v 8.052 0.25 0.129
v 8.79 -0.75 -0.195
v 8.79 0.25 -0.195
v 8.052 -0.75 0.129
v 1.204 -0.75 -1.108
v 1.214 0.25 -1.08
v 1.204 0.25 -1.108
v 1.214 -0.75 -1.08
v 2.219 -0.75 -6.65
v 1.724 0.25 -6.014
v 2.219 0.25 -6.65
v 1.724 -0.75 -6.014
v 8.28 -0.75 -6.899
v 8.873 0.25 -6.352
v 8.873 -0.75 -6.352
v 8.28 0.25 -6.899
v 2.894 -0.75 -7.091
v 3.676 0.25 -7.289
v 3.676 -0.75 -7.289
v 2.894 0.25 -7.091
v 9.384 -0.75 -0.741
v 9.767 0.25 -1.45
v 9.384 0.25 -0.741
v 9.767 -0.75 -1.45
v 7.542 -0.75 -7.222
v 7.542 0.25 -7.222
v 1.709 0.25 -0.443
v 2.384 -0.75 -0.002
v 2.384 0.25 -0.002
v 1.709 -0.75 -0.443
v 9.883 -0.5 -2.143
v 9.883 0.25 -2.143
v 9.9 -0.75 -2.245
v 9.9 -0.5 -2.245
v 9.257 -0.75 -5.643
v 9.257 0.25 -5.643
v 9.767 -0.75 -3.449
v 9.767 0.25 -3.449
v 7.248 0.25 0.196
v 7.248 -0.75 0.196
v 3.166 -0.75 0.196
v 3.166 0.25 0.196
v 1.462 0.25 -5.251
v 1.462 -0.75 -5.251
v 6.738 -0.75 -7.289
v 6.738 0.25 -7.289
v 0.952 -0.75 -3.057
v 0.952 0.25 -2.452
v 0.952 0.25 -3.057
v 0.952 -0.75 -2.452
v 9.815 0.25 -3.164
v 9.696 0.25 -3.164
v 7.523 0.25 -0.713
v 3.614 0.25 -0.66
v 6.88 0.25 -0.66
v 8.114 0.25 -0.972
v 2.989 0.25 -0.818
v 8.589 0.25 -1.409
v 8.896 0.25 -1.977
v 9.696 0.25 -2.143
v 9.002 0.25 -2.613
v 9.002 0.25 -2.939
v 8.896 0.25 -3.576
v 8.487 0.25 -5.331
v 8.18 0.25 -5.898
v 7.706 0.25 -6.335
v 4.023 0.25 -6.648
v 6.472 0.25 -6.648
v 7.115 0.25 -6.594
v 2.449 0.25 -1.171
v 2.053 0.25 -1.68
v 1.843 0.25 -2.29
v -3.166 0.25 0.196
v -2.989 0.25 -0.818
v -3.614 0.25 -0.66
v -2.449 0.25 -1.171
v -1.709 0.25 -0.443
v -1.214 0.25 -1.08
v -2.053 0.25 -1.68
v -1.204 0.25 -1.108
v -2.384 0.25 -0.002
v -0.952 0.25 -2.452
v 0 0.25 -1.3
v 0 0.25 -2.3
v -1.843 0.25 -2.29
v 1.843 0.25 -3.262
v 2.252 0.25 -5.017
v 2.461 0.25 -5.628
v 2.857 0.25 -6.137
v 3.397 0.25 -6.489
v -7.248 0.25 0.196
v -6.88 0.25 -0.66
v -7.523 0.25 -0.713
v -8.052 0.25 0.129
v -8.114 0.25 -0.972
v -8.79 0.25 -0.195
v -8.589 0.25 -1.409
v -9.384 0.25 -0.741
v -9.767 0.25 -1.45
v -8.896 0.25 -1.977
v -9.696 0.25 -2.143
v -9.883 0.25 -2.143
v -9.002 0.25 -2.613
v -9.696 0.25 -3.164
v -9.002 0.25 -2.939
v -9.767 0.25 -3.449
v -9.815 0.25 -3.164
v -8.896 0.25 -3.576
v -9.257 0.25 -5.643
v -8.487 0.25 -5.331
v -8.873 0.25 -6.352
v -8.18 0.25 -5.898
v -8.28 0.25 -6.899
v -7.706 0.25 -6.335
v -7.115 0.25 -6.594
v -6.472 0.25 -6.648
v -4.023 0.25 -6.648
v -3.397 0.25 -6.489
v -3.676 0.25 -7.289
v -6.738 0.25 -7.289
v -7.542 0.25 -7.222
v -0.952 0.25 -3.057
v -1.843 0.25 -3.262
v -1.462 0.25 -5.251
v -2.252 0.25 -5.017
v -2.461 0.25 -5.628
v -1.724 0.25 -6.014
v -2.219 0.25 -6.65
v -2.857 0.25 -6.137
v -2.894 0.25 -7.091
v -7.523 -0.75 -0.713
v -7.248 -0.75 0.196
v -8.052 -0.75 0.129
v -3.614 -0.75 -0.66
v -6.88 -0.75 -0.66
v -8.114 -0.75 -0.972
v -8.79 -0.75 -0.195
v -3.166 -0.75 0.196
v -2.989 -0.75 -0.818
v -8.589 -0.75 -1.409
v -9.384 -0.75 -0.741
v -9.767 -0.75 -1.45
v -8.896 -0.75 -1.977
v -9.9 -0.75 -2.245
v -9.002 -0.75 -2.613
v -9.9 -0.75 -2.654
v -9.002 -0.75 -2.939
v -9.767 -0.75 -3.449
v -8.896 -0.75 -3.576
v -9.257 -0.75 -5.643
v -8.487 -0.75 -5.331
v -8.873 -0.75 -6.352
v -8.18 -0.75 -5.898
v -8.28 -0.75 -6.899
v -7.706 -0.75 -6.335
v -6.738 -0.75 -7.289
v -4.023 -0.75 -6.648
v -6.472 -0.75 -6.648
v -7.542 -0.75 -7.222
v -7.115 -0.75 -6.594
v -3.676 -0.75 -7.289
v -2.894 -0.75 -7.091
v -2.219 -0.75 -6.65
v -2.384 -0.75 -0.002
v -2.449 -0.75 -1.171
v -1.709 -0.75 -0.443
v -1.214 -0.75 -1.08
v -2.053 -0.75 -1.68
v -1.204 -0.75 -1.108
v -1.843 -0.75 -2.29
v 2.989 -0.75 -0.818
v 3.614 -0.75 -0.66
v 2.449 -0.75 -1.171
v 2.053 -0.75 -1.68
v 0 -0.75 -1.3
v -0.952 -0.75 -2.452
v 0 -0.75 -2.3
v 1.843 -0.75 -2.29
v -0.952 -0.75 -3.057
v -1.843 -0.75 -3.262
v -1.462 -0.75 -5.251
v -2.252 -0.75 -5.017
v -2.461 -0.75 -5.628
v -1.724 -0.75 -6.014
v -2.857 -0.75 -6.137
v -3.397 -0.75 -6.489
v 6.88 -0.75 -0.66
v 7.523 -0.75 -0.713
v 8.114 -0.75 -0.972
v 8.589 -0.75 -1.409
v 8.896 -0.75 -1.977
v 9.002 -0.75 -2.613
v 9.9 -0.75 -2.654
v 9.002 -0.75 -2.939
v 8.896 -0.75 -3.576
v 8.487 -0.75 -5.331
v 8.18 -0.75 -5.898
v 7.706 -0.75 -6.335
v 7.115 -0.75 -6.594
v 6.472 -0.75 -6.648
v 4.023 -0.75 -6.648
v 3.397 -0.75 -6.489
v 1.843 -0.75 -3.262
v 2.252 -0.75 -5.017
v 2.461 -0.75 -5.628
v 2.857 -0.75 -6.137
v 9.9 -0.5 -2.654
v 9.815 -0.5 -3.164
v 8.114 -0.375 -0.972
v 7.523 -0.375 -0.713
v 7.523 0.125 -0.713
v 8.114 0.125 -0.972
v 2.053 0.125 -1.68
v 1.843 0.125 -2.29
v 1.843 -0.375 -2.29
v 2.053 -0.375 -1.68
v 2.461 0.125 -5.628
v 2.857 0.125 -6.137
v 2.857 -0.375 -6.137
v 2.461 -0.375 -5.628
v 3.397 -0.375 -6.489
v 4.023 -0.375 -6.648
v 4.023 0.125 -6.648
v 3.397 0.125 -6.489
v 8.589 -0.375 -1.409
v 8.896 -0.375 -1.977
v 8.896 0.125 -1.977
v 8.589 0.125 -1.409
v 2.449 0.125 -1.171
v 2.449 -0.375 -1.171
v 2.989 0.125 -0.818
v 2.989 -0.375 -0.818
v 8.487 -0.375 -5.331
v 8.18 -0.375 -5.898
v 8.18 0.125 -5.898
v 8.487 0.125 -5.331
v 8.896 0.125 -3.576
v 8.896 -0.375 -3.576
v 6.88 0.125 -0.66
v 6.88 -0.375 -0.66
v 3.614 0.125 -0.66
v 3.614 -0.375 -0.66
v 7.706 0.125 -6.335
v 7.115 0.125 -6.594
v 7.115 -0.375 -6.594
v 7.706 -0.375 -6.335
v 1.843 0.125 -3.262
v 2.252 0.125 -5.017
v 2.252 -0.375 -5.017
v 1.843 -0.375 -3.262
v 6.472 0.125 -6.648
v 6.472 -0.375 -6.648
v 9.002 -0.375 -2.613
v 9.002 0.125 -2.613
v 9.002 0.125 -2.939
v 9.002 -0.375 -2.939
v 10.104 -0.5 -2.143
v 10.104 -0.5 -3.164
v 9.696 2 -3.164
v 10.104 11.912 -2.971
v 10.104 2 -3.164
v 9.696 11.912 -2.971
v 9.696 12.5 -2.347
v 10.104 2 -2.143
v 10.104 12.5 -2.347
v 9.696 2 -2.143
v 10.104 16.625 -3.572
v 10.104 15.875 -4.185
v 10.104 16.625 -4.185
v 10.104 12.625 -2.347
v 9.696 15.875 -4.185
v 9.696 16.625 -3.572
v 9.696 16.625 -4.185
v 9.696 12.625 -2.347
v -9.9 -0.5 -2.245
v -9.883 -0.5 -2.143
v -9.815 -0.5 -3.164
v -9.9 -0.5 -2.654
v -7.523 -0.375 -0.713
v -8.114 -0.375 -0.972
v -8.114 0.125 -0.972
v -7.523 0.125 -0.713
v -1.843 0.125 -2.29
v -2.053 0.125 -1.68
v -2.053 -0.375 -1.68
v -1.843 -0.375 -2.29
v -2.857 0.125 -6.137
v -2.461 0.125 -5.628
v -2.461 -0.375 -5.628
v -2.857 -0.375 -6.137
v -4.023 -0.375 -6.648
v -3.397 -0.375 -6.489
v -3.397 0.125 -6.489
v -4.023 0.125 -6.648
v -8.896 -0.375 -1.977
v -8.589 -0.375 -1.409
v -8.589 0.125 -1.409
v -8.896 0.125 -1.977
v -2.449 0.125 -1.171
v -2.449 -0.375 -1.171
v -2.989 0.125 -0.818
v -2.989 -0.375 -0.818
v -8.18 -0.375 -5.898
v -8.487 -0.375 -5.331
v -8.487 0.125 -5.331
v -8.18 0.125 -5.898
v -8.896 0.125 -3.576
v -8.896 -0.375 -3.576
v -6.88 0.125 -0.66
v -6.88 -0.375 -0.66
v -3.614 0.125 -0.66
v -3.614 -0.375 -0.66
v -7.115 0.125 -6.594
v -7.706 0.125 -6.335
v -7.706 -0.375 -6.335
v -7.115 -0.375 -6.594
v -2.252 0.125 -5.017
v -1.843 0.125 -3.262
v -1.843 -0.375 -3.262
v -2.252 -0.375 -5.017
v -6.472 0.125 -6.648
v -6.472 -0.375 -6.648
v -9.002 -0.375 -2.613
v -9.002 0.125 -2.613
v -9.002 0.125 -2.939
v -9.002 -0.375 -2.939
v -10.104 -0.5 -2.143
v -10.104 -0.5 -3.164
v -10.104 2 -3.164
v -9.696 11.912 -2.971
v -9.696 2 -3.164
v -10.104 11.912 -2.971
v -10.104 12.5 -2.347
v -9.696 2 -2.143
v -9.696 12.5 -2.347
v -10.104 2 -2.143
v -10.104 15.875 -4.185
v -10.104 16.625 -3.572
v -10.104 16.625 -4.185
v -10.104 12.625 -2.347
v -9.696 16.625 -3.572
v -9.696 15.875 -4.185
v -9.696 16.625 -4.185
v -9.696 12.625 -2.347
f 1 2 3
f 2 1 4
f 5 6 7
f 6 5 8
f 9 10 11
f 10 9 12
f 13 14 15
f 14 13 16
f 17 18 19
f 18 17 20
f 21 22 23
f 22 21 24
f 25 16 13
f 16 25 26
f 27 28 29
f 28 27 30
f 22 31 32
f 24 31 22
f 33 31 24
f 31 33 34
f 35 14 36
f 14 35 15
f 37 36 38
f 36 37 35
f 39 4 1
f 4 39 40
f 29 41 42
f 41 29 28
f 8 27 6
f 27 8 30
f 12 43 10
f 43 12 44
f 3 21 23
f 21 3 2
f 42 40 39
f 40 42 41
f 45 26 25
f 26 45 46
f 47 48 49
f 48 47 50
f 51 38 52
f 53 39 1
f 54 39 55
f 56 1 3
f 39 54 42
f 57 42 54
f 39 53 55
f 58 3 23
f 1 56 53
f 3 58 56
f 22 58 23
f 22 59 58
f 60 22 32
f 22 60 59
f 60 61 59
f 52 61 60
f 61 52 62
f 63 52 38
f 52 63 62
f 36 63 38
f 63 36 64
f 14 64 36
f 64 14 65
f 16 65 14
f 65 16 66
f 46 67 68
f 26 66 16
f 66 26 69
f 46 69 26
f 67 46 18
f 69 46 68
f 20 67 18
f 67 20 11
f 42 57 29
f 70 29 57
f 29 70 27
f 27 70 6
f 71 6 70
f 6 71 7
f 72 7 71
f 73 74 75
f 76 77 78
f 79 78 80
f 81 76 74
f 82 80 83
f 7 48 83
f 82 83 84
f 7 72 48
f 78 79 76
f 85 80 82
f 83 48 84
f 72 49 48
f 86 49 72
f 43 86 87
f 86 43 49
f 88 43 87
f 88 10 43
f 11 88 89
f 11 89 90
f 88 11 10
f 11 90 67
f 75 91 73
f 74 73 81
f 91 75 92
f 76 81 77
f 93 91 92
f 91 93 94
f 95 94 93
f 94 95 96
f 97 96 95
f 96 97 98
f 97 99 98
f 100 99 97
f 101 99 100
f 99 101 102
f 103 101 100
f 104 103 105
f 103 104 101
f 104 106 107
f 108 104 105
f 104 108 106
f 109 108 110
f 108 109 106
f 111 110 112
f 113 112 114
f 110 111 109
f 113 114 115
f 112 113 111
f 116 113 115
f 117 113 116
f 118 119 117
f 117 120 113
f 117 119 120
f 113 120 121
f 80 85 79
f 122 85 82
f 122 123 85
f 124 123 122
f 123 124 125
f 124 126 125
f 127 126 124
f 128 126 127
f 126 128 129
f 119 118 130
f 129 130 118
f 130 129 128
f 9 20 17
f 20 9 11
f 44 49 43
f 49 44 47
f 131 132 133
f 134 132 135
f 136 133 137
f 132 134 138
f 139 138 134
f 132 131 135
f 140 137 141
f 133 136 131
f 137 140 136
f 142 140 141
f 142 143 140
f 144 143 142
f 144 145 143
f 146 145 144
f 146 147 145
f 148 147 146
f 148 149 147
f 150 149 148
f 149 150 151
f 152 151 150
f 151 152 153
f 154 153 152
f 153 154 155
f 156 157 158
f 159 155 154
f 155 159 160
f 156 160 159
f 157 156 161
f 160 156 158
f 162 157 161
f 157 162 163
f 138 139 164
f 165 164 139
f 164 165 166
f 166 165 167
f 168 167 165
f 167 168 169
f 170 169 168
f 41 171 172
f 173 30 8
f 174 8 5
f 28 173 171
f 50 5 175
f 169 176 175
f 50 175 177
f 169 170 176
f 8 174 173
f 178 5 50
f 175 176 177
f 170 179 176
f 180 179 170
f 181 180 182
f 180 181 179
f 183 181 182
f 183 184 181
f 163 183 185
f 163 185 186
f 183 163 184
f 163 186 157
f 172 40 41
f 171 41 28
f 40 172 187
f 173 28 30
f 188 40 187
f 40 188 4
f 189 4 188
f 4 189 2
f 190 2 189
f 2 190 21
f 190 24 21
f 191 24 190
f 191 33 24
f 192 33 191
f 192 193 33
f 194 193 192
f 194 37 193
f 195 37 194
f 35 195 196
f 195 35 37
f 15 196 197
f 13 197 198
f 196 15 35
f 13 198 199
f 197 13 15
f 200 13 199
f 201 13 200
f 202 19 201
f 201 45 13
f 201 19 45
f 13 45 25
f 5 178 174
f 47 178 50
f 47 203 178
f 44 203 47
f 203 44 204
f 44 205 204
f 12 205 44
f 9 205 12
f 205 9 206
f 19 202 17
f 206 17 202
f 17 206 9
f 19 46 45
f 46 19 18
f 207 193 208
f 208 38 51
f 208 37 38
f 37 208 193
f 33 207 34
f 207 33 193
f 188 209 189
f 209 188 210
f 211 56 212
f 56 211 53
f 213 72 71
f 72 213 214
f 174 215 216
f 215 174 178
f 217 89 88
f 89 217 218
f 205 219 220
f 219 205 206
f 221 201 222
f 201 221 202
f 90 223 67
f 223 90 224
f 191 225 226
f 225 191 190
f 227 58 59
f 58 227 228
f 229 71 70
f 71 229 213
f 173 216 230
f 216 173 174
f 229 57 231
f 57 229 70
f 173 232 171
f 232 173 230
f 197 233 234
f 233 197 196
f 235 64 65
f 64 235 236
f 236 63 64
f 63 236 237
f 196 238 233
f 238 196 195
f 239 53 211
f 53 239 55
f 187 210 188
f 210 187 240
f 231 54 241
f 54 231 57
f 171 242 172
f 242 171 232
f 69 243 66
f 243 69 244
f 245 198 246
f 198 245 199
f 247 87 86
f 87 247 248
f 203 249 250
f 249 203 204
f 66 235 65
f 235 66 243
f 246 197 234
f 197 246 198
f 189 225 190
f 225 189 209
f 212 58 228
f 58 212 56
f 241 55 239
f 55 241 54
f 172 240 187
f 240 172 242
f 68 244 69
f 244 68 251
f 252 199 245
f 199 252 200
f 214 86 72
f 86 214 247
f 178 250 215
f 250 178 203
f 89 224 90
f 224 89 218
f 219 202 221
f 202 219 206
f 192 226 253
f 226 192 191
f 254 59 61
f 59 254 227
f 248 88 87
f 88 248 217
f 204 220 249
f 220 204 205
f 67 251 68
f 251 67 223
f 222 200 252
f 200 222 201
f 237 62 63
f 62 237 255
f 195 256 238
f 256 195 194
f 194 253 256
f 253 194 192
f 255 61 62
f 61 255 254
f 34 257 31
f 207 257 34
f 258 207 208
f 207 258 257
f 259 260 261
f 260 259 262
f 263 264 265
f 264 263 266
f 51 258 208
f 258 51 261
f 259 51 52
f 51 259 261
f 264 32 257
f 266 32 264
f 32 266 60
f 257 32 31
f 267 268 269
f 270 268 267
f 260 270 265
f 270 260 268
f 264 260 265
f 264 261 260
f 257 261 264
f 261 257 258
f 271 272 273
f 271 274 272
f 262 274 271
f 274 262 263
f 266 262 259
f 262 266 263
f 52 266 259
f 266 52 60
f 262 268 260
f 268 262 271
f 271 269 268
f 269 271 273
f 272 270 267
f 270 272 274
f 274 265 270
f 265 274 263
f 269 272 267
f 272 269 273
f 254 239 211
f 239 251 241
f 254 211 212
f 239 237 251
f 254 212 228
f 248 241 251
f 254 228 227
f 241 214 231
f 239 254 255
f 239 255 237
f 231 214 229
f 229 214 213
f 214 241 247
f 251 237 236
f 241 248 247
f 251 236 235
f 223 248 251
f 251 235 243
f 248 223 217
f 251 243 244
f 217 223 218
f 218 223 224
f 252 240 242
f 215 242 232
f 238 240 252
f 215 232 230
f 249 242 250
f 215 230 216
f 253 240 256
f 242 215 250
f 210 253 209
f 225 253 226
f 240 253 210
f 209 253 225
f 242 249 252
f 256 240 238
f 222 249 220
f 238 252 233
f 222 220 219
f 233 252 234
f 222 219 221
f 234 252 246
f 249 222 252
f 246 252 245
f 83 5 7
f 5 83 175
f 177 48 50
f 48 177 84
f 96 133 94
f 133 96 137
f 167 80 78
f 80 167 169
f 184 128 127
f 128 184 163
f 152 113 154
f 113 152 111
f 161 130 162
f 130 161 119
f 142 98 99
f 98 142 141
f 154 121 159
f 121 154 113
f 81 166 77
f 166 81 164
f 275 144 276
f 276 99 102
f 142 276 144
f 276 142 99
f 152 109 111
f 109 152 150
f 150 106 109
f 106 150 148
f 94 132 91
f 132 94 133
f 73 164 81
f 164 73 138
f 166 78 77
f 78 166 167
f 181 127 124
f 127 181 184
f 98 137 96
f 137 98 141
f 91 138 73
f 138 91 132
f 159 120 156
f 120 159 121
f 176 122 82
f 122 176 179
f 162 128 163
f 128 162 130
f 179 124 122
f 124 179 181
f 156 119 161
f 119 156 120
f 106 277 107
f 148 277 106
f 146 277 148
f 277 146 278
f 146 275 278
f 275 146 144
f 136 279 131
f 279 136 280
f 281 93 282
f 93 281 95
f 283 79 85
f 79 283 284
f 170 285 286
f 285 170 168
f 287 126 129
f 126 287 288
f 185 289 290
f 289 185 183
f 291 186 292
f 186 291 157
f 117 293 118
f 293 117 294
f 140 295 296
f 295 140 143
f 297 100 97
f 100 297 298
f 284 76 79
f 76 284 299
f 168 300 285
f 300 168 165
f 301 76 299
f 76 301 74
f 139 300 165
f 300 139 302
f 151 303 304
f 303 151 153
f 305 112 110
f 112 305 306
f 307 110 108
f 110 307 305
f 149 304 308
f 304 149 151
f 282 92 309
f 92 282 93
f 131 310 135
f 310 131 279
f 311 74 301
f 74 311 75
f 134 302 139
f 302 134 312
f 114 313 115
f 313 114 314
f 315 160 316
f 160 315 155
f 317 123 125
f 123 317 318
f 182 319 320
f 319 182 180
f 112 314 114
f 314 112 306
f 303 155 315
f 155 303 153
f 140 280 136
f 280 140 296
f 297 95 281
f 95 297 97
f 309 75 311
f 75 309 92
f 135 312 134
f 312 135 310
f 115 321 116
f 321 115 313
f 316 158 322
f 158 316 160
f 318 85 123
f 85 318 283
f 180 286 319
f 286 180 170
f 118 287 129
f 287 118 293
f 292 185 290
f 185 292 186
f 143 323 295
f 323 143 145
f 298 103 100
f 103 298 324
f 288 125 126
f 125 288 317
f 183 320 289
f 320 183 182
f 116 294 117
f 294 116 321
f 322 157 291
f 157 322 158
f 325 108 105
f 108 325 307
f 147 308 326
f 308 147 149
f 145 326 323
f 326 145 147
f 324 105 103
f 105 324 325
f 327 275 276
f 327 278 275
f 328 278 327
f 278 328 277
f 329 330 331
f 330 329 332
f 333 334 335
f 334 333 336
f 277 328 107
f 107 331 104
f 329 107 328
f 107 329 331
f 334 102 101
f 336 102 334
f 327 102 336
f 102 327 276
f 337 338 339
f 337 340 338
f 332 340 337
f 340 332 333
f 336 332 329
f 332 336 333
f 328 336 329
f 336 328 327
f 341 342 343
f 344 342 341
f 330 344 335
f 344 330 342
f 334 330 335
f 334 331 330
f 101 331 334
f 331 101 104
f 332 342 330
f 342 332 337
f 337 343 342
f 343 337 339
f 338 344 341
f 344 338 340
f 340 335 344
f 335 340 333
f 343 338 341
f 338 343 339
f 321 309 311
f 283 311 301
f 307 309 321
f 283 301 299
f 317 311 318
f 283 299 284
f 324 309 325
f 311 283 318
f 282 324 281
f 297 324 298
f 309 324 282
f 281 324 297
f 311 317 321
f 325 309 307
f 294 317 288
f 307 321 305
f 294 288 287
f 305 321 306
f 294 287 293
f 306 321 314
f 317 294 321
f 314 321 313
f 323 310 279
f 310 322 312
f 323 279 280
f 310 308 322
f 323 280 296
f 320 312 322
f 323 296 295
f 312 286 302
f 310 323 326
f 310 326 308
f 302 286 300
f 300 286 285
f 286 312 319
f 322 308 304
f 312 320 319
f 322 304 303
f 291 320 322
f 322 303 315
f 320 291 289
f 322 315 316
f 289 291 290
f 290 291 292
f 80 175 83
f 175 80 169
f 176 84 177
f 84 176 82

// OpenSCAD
// [FL_INDEX: keywords="openscad, 3d_parametric, Parametric_Glasses, csg_solid" | COT="Parametric OpenSCAD design from 3DCodeverse"]
// Title: Parametric Glasses

/* Parametric glasses by Ticha Sethapakdi */

//----USER DEFINED VARIABLES-----

//the style of the glasses can either be 'squared' or 'oval'
frame = "squared";
//value from 1-6; can technically be larger, but some parts may look awkward...
roundedness = 6;

//1 for regular glasses; 2 for sunglasses
style = 2;

width = 10;
height = 5;
length = 14;

//for "oval" mode only:
//(not really working at the moment, so keep this the same for now)
radius = 7;

//see the SVG color list (http://en.wikibooks.org/wiki/OpenSCAD_User_Manual/The_OpenSCAD_Language#color) 
//for all possible color selections
//e.g. Crimson, Coral, Fuchsia, Chocolate, Navy...
frame_color = "Crimson";

//if the style is "sunglasses", the user may customize the color of the lens
//again, consult the SVG color list for a range of selections
lens_color = "Aqua";


//-------------------------------

/* The glasses are created here */
eyegap = 5;

if(frame == "squared") {
	rotate([90,0,0]) {
		translate([sqrt(roundedness), -sqrt(roundedness), 0]){
		scale([1/sqrt(roundedness), 1/sqrt(roundedness), 0.5]){
		translate([width/2+eyegap/2-1.5/roundedness, 0,0]) {
			//draws one side of the frame
			color(frame_color) {
				difference() { 
					minkowski() {
						hull() {
							cube([width, 1, 1], center = true);
							translate([0,-height+1,0]){cube([3*width/4, 3*height/4, 1], center = true);}
						}
						cylinder(r=roundedness, h=1);
					}

					translate([0,-0.8,0]){ scale([0.8,0.8,2]){
					minkowski() {
						hull() {
							cube([width, 1, 1], center = true);
							translate([0,-height+1,0]){cube([3*width/4, 3*height/4, 1], center = true);}
						}
						cylinder(r=roundedness, h=1);
					}}}
				}

			}
			
			//draws the lens
			if(style == 2) {
				color(lens_color, 0.7) {
					translate([0,-0.8,0]){ scale([0.8,0.8,0.5]){
					minkowski() {
						hull() {
							cube([width, 1, 1], center = true);
							translate([0,-height+1,0]){cube([3*width/4, 3*height/4, 1], center = true);}
						}
						cylinder(r=roundedness, h=1);
					}}}
				}
			}
			
			else {
				color("white", 0.4) {
					translate([0,-0.8,0]){ scale([0.8,0.8,0.5]){
					minkowski() {
						hull() {
							cube([width, 1, 1], center = true);
							translate([0,-height+1,0]){cube([3*width/4, 3*height/4, 1], center = true);}
						}
						cylinder(r=roundedness, h=1);
					}}}
				}
			}

			//leg
			color(frame_color) {
				hull() {
					translate([width/2 + roundedness, (height/2)*0.6-2,-1.5]){ 
						cube([1, 2.5, 5], center = true);  	
					}
						
					translate([width/2 + roundedness, (height/2)*0.6-2,-23.5]){ 
						cube([1, 1.5, 3], center = true);
					}
					
				}
				hull() {
					translate([width/2 + roundedness, (height/2)*0.6-2,-24.5]){ 
						cube([1, 1.5, 1.5], center = true);
					}
					translate([width/2 + roundedness, (height/2)*0.6-5,-32.5]){ 
								cube([1, 1.5, 1.5], center = true);
					}
				}
			}

		}}}

		//bridge
		color(frame_color) {
		
			hull() {
				translate([0.25, -1.8, 0.25]){ 
						cube([0.5, 1, 1], center = true);
				}
				translate([eyegap/3, -1.8, 0.25]){ 
						cube([0.2, 1.5, 1], center = true);
				}
			}
		}
	}

	mirror([1,0,0]) {rotate([90,0,0]) {
		translate([sqrt(roundedness), -sqrt(roundedness), 0]){
		scale([1/sqrt(roundedness), 1/sqrt(roundedness), 0.5]){
		translate([width/2+eyegap/2-1.5/roundedness, 0,0]) {
			//draws one side of the frame
			color(frame_color) {
				difference() { 
					minkowski() {
						hull() {
							cube([width, 1, 1], center = true);
							translate([0,-height+1,0]){cube([3*width/4, 3*height/4, 1], center = true);}
						}
						cylinder(r=roundedness, h=1);
					}
					translate([0,-0.8,0]){ scale([0.8,0.8,2]){
					minkowski() {
						hull() {
							cube([width, 1, 1], center = true);
							translate([0,-height+1,0]){cube([3*width/4, 3*height/4, 1], center = true);}
						}
						cylinder(r=roundedness, h=1);
					}}}
				}

			}
			
			//draws the lens
			if(style == 2) {
				color(lens_color, 0.7) {
					translate([0,-0.8,0]){ scale([0.8,0.8,0.5]){
					minkowski() {
						hull() {
							cube([width, 1, 1], center = true);
							translate([0,-height+1,0]){cube([3*width/4, 3*height/4, 1], center = true);}
						}
						cylinder(r=roundedness, h=1);
					}}}
				}
			}
			
			else {
				color("white", 0.4) {
					translate([0,-0.8,0]){ scale([0.8,0.8,0.5]){
					minkowski() {
						hull() {
							cube([width, 1, 1], center = true);
							translate([0,-height+1,0]){cube([3*width/4, 3*height/4, 1], center = true);}
						}
						cylinder(r=roundedness, h=1);
					}}}
				}
			}

			//leg
			color(frame_color) {
				hull() {
					translate([width/2 + roundedness, (height/2)*0.6-2,-1.5]){ 
						cube([1, 2.5, 5], center = true);  	
					}
						
					translate([width/2 + roundedness, (height/2)*0.6-2,-23.5]){ 
						cube([1, 1.5, 3], center = true);
					}
					
				}
				hull() {
					translate([width/2 + roundedness, (height/2)*0.6-2,-24.5]){ 
						cube([1, 1.5, 1.5], center = true);
					}
					translate([width/2 + roundedness, (height/2)*0.6-5,-32.5]){ 
								cube([1, 1.5, 1.5], center = true);
					}
				}
			}

		}}}

		//bridge
		color(frame_color) {
		
			hull() {
				translate([0.25, -1.8, 0.25]){ 
						cube([0.5, 1, 1], center = true);
				}
				translate([eyegap/3, -1.8, 0.25]){ 
						cube([0.2, 1.5, 1], center = true);
				}
			}
		}
	}}

}


//ROUNDED FRAME
else if (frame == "oval") {
	rotate([90,0,0]) {
		translate([6.5*radius/8+eyegap/2, 0,0]) {
			//draws one side of the frame
			color(frame_color) {
				difference() { 
					cylinder(1,radius,radius, center = true);

					scale([0.8,0.8,2]){
						cylinder(1,radius,radius, center = true);
					}				
					
				}

			}

			//draws the lens
			if(style == 2) {
				color(lens_color, 0.7) {
					scale([0.8,0.8,0.5]){
						cylinder(1,radius,radius, center = true);
					}	
				}
			}
			
			else {
				color("white", 0.4) {
					scale([0.8,0.8,0.5]){
						cylinder(1,radius,radius, center = true);
					}	
				}

			}

			//leg
			color(frame_color) {
				hull() {
					translate([radius, 0, -2]){ 
						cube([1, 2.5, 5], center = true);  	
					}
						
					translate([radius, 0,-23.5]){ 
						cube([1, 1.5, 3], center = true);
					}
					
				}
				hull() {
					translate([radius, 0 ,-24.5]){ 
						cube([1, 1.5, 1.5], center = true);
					}
					translate([radius, -2,-32.5]){ 
								cube([1, 1.5, 1.5], center = true);
					}
				}
			}

		}

		//bridge
		color(frame_color) {
		
			hull() {
				translate([0.25, 1.5, 0]){ 
						cube([0.5, 1, 1], center = true);
				}
				translate([eyegap/3, 1.5, 0]){ 
						cube([0.2, 1.5, 1], center = true);
				}
			}
		}
	}

	mirror([1,0,0]) {rotate([90,0,0]) {
		translate([6.5*radius/8+eyegap/2, 0,0]) {
			//draws one side of the frame
			color(frame_color) {
				difference() { 
					cylinder(1,radius,radius, center = true);

					scale([0.8,0.8,2]){
						cylinder(1,radius,radius, center = true);
					}				
					
				}

			}

			//draws the lens
			if(style == 2) {
				color(lens_color, 0.7) {
					scale([0.8,0.8,0.5]){
						cylinder(1,radius,radius, center = true);
					}	
				}
			}
			
			else {
				color("white", 0.4) {
					scale([0.8,0.8,0.5]){
						cylinder(1,radius,radius, center = true);
					}	
				}

			}

			//leg
			color(frame_color) {
				hull() {
					translate([radius, 0, -2]){ 
						cube([1, 2.5, 5], center = true);  	
					}
						
					translate([radius, 0,-23.5]){ 
						cube([1, 1.5, 3], center = true);
					}
					
				}
				hull() {
					translate([radius, 0 ,-24.5]){ 
						cube([1, 1.5, 1.5], center = true);
					}
					translate([radius, -2,-32.5]){ 
								cube([1, 1.5, 1.5], center = true);
					}
				}
			}

		}

		//bridge
		color(frame_color) {
		
			hull() {
				translate([0.25, 1.5, 0]){ 
						cube([0.5, 1, 1], center = true);
				}
				translate([eyegap/3, 1.5, 0]){ 
						cube([0.2, 1.5, 1], center = true);
				}
			}
		}
	}}

			
}

else {
	echo("Undefined frame style!");
}
